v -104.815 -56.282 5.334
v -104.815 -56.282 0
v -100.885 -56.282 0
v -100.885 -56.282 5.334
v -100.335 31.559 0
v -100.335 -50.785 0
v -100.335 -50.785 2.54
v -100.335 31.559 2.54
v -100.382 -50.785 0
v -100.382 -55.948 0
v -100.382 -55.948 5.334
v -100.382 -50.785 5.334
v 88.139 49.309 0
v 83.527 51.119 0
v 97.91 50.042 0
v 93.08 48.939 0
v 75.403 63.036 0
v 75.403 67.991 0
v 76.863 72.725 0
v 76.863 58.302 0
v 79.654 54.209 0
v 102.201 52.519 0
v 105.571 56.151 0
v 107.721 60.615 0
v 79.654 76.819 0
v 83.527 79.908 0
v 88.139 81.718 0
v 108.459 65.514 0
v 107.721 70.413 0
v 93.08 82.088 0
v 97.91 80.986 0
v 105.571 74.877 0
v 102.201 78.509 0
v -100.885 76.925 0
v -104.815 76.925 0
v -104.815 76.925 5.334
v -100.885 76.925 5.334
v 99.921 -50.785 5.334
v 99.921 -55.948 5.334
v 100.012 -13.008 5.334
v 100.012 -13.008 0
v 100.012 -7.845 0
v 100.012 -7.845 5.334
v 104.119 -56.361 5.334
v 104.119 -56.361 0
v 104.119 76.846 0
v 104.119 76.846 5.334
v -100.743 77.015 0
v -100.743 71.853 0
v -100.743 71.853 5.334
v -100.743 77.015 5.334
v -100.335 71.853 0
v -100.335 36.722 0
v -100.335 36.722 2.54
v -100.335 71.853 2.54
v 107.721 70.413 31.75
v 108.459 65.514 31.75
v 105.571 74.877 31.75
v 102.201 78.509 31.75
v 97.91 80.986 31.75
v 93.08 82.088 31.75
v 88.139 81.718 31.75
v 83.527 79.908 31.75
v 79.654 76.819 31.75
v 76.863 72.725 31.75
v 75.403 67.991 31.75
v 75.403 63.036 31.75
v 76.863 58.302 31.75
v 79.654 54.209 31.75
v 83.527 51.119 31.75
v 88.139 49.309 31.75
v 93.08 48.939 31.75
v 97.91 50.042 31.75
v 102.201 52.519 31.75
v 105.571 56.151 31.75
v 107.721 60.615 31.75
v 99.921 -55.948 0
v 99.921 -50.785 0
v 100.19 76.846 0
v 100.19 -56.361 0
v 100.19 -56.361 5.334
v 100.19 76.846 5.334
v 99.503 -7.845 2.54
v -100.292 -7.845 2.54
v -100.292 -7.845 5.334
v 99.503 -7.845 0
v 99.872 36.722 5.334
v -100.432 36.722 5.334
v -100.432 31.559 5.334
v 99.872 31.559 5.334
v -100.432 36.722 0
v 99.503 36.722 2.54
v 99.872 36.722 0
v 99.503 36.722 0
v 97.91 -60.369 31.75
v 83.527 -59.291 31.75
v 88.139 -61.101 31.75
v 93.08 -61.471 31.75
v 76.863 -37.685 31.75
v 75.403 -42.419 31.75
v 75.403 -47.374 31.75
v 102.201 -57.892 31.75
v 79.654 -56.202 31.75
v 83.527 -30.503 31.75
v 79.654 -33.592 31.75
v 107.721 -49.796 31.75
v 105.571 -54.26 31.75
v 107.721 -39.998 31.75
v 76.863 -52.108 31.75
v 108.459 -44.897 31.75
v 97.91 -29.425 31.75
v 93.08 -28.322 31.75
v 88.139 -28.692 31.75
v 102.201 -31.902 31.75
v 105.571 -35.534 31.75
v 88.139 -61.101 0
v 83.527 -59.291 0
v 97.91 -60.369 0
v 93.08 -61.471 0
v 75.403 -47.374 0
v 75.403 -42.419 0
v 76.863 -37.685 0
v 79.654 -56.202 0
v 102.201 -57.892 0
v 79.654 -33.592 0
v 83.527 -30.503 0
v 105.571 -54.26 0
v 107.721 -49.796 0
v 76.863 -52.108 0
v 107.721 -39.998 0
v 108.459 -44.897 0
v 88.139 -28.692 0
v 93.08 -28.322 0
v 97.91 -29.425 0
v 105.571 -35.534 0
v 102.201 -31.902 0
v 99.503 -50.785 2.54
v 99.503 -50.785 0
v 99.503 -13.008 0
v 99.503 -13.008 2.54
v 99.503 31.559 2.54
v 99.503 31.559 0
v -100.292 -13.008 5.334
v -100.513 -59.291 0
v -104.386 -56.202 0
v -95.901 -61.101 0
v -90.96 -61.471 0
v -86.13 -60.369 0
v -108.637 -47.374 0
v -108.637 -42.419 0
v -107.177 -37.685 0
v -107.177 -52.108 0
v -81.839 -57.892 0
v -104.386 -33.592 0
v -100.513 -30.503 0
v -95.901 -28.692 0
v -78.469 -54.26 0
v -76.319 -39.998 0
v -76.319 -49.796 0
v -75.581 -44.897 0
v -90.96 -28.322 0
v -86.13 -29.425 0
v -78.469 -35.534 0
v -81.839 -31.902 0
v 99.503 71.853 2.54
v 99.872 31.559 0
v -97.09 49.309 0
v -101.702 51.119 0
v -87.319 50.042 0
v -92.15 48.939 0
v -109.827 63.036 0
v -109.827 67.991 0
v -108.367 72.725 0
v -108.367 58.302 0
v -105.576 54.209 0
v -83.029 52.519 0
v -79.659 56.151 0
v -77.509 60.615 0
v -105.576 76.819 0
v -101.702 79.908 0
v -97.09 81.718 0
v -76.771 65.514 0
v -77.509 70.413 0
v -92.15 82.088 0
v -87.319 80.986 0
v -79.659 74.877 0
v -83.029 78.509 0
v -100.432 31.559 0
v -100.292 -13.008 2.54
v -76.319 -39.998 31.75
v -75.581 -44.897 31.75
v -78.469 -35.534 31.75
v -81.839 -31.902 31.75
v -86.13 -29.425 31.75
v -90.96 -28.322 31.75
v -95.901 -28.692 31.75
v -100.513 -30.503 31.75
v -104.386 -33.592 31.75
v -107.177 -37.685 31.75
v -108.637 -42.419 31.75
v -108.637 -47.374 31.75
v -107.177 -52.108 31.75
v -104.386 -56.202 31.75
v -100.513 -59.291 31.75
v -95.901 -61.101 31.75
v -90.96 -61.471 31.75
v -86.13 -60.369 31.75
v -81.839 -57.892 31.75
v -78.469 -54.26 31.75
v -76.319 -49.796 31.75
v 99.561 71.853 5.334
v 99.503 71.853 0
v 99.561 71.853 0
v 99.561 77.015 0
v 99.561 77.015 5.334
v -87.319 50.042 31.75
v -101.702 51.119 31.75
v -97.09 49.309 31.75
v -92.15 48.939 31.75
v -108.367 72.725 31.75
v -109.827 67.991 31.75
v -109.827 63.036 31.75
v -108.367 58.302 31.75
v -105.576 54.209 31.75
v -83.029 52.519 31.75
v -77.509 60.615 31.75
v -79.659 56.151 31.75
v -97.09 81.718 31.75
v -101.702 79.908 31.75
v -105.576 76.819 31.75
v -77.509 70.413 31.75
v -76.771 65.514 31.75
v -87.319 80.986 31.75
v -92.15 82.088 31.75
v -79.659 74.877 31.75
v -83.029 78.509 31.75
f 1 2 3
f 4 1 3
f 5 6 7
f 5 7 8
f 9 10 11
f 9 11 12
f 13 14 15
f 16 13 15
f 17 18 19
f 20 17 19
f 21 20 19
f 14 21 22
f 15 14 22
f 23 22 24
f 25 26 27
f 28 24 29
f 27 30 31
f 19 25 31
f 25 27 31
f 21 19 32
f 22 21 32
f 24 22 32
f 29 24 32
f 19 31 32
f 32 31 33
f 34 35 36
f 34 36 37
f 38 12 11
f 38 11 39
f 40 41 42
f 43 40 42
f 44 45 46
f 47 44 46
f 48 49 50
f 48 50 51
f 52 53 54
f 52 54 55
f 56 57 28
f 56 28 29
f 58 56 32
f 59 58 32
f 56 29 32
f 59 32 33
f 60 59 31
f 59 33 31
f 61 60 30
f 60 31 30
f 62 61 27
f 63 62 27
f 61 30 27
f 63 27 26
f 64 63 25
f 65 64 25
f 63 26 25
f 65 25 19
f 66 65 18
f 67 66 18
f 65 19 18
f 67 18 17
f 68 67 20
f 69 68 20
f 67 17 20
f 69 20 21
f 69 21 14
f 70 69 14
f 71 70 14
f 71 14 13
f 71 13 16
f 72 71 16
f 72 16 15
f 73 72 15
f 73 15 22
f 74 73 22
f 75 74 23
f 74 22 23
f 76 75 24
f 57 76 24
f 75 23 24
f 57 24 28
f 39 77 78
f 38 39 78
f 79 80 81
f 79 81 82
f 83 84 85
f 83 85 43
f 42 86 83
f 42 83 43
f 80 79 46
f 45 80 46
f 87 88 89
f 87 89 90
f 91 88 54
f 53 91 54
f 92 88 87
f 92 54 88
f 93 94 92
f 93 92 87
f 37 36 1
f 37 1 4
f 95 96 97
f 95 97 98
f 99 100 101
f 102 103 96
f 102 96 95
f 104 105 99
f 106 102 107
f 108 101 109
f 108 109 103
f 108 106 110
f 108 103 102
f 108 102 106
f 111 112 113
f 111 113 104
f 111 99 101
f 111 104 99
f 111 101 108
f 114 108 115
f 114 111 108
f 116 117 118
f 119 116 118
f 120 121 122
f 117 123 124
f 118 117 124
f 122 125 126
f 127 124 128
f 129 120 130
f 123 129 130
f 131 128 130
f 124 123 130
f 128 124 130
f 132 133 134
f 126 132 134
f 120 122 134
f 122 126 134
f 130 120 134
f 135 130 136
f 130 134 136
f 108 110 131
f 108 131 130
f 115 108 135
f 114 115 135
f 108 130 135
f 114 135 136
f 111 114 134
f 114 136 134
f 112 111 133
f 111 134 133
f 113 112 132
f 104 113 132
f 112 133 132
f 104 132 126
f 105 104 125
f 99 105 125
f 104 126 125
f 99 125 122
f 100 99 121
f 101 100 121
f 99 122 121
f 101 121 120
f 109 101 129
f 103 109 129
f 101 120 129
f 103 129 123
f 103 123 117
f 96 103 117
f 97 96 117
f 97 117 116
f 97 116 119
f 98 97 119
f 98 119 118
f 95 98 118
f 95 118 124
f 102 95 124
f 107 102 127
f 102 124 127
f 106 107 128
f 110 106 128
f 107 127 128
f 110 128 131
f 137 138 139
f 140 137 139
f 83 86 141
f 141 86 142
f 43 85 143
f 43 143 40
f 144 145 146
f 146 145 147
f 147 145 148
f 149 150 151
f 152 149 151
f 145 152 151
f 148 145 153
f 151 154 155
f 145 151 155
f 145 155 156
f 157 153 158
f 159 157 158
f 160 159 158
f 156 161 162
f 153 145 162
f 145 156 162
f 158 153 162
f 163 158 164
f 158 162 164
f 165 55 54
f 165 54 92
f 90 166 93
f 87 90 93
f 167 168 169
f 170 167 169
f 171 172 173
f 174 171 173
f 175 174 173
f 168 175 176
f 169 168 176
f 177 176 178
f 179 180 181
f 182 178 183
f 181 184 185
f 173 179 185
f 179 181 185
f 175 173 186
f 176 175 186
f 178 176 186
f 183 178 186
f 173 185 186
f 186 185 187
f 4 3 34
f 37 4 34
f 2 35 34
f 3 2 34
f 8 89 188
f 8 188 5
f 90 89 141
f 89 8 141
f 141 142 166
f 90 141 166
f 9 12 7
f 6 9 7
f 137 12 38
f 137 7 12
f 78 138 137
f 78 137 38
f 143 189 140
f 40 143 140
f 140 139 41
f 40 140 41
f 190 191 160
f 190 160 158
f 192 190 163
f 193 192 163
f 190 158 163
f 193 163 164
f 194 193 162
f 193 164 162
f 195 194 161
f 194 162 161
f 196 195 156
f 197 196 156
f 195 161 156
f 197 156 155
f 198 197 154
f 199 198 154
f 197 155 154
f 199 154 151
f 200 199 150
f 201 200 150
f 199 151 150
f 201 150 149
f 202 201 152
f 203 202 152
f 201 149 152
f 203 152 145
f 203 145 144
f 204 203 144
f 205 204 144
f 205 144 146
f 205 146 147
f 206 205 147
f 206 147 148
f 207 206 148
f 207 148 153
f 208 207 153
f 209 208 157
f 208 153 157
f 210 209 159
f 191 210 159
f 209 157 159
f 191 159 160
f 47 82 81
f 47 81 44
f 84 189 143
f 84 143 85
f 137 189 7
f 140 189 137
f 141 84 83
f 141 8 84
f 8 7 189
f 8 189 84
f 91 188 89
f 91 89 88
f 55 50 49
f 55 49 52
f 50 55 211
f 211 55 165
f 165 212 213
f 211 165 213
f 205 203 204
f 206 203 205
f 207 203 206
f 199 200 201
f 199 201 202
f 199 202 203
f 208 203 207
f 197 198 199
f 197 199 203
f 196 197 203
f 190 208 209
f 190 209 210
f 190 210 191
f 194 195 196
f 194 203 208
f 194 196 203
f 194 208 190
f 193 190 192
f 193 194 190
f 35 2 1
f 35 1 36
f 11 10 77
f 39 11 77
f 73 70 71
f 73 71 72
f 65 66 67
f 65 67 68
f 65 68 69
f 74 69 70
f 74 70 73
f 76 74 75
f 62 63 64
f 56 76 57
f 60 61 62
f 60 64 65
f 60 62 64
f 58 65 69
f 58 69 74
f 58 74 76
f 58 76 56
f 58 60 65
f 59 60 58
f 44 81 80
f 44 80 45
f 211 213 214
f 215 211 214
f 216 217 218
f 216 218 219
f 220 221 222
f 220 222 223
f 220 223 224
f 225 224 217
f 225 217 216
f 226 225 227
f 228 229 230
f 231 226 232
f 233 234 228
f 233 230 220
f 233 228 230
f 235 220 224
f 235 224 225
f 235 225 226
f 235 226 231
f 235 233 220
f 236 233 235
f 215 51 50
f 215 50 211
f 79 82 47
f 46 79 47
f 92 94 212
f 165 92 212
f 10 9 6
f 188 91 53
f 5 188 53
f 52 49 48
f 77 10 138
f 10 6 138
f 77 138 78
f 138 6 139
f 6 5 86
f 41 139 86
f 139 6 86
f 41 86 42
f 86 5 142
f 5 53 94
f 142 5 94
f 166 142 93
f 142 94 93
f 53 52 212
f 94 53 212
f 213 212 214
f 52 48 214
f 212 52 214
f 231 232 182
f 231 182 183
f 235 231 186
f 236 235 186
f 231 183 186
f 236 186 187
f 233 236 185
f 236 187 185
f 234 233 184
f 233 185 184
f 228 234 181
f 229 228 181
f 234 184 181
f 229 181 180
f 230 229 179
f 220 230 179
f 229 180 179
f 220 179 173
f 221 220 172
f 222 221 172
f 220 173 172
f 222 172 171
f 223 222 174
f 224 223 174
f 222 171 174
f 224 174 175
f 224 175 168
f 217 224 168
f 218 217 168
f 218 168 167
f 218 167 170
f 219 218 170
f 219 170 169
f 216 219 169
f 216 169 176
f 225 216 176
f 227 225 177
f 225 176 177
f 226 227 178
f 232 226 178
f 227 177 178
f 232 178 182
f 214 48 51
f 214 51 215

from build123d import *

# Parameters (mm, degrees)
F0_W      = 6.0556903481
F0_H      = 132.6194964349
F1_DEPTH  = 2.54
F2_W      = 200.3036439419
F2_H      = 5.1624625921
F4_DEPTH  = 5.334
F5_DEPTH  = 5.334
F6_DEPTH  = 5.334
F7_W      = 3.9294064045
F7_H      = 133.2067586482
F8_DEPTH  = 5.334
F9_R      = 16.621019502
F10_DEPTH = 31.75


# Not quite as in the source:
# - the program builds the solid bodies; features that only make, move or delete a surface that nothing else refers to are left out


with BuildPart() as f1:
    # F0 (on Top) → F1 (new body)
    with BuildSketch(Plane.XY):
        with Locations((-97.3073802888, 10.3850681335)):
            Rectangle(F0_W, F0_H)
        with Locations((-91.2516899407, 10.3850681335)):
            Rectangle(F0_W, F0_H)
        with Locations((-85.1959995925, 10.3850681335)):
            Rectangle(F0_W, F0_H)
        with Locations((-79.1403092444, 10.3850681335)):
            Rectangle(F0_W, F0_H)
        with Locations((-73.0846188962, 10.3850681335)):
            Rectangle(F0_W, F0_H)
        with Locations((-67.0289285481, 10.3850681335)):
            Rectangle(F0_W, F0_H)
        with Locations((-60.9732381999, 10.3850681335)):
            Rectangle(F0_W, F0_H)
        with Locations((-54.9175478518, 10.3850681335)):
            Rectangle(F0_W, F0_H)
        with Locations((-48.8618575037, 10.3850681335)):
            Rectangle(F0_W, F0_H)
        with Locations((-42.8061671555, 10.3850681335)):
            Rectangle(F0_W, F0_H)
        with Locations((-36.7504768074, 10.3850681335)):
            Rectangle(F0_W, F0_H)
        with Locations((-30.6947864592, 10.3850681335)):
            Rectangle(F0_W, F0_H)
        with Locations((-24.6390961111, 10.3850681335)):
            Rectangle(F0_W, F0_H)
        with Locations((-18.5834057629, 10.3850681335)):
            Rectangle(F0_W, F0_H)
        with Locations((-12.5277154148, 10.3850681335)):
            Rectangle(F0_W, F0_H)
        with Locations((-6.4720250666, 10.3850681335)):
            Rectangle(F0_W, F0_H)
        with Locations((-0.4163347185, 10.3850681335)):
            Rectangle(F0_W, F0_H)
        with Locations((5.6393556297, 10.3850681335)):
            Rectangle(F0_W, F0_H)
        with Locations((11.6950459778, 10.3850681335)):
            Rectangle(F0_W, F0_H)
        with Locations((17.750736326, 10.3850681335)):
            Rectangle(F0_W, F0_H)
        with Locations((23.8064266741, 10.3850681335)):
            Rectangle(F0_W, F0_H)
        with Locations((29.8621170223, 10.3850681335)):
            Rectangle(F0_W, F0_H)
        with Locations((35.9178073704, 10.3850681335)):
            Rectangle(F0_W, F0_H)
        with Locations((41.9734977186, 10.3850681335)):
            Rectangle(F0_W, F0_H)
        with Locations((48.0291880667, 10.3850681335)):
            Rectangle(F0_W, F0_H)
        with Locations((54.0848784149, 10.3850681335)):
            Rectangle(F0_W, F0_H)
        with Locations((60.140568763, 10.3850681335)):
            Rectangle(F0_W, F0_H)
        with Locations((66.1962591112, 10.3850681335)):
            Rectangle(F0_W, F0_H)
        with Locations((72.2519494593, 10.3850681335)):
            Rectangle(F0_W, F0_H)
        with Locations((78.3076398075, 10.3850681335)):
            Rectangle(F0_W, F0_H)
        with Locations((84.3633301556, 10.3850681335)):
            Rectangle(F0_W, F0_H)
        with Locations((90.4190205038, 10.3850681335)):
            Rectangle(F0_W, F0_H)
        with Locations((96.4747108519, 10.3850681335)):
            Rectangle(F0_W, F0_H)
    extrude(amount=F1_DEPTH)

    # F2 (on Top) → F4 (join)
    with BuildSketch(Plane.XY):
        with Locations((-0.2800673246, 34.1405831277)):
            Rectangle(F2_W, F2_H)
    extrude(amount=F4_DEPTH)

    # F2 (on Top) → F5 (join)
    with BuildSketch(Plane.XY):
        with Locations((-0.1398418099, -10.4263699614)):
            Rectangle(F2_W, F2_H)
    extrude(amount=F5_DEPTH)

    # F2 (on Top) → F6 (join)
    with BuildSketch(Plane.XY):
        with Locations((-0.5909577012, 74.434235692)):
            Rectangle(F2_W, F2_H)
        with Locations((-0.2800673246, 34.1405831277)):
            Rectangle(F2_W, F2_H)
        with Locations((-0.2306103706, -53.3664822578)):
            Rectangle(F2_W, F2_H)
        with Locations((-0.1398418099, -10.4263699614)):
            Rectangle(F2_W, F2_H)
    extrude(amount=F6_DEPTH)


with BuildPart() as f8:
    # F7 (on Top) → F8 (new body)
    with BuildSketch(Plane.XY):
        with Locations((102.1542623639, 10.2424006909)):
            Rectangle(F7_W, F7_H)
    extrude(amount=F8_DEPTH)


with BuildPart() as f8b:
    # F7 (on Top) → F8, piece 2 (new body)
    with BuildSketch(Plane.XY):
        with Locations((-102.8498336673, 10.3216152638)):
            Rectangle(F7_W, F7_H)
    extrude(amount=F8_DEPTH)


with BuildPart() as f10:
    # F9 (on Top) → F10 (new body)
    with BuildSketch(Plane.XY):
        with Locations((91.8380022049, 65.513715148)):
            Circle(F9_R)
    extrude(amount=F10_DEPTH)


with BuildPart() as f10b:
    # F9 (on Top) → F10, piece 2 (new body)
    with BuildSketch(Plane.XY):
        with Locations((91.8380022049, -44.8967292905)):
            Circle(F9_R)
    extrude(amount=F10_DEPTH)


with BuildPart() as f10c:
    # F9 (on Top) → F10, piece 3 (new body)
    with BuildSketch(Plane.XY):
        with Locations((-93.3917686343, 65.513715148)):
            Circle(F9_R)
    extrude(amount=F10_DEPTH)


with BuildPart() as f10d:
    # F9 (on Top) → F10, piece 4 (new body)
    with BuildSketch(Plane.XY):
        with Locations((-92.2020450234, -44.8967292905)):
            Circle(F9_R)
    extrude(amount=F10_DEPTH)


solid = Compound([f1.part, f8.part, f8b.part, f10.part, f10b.part, f10c.part, f10d.part])
